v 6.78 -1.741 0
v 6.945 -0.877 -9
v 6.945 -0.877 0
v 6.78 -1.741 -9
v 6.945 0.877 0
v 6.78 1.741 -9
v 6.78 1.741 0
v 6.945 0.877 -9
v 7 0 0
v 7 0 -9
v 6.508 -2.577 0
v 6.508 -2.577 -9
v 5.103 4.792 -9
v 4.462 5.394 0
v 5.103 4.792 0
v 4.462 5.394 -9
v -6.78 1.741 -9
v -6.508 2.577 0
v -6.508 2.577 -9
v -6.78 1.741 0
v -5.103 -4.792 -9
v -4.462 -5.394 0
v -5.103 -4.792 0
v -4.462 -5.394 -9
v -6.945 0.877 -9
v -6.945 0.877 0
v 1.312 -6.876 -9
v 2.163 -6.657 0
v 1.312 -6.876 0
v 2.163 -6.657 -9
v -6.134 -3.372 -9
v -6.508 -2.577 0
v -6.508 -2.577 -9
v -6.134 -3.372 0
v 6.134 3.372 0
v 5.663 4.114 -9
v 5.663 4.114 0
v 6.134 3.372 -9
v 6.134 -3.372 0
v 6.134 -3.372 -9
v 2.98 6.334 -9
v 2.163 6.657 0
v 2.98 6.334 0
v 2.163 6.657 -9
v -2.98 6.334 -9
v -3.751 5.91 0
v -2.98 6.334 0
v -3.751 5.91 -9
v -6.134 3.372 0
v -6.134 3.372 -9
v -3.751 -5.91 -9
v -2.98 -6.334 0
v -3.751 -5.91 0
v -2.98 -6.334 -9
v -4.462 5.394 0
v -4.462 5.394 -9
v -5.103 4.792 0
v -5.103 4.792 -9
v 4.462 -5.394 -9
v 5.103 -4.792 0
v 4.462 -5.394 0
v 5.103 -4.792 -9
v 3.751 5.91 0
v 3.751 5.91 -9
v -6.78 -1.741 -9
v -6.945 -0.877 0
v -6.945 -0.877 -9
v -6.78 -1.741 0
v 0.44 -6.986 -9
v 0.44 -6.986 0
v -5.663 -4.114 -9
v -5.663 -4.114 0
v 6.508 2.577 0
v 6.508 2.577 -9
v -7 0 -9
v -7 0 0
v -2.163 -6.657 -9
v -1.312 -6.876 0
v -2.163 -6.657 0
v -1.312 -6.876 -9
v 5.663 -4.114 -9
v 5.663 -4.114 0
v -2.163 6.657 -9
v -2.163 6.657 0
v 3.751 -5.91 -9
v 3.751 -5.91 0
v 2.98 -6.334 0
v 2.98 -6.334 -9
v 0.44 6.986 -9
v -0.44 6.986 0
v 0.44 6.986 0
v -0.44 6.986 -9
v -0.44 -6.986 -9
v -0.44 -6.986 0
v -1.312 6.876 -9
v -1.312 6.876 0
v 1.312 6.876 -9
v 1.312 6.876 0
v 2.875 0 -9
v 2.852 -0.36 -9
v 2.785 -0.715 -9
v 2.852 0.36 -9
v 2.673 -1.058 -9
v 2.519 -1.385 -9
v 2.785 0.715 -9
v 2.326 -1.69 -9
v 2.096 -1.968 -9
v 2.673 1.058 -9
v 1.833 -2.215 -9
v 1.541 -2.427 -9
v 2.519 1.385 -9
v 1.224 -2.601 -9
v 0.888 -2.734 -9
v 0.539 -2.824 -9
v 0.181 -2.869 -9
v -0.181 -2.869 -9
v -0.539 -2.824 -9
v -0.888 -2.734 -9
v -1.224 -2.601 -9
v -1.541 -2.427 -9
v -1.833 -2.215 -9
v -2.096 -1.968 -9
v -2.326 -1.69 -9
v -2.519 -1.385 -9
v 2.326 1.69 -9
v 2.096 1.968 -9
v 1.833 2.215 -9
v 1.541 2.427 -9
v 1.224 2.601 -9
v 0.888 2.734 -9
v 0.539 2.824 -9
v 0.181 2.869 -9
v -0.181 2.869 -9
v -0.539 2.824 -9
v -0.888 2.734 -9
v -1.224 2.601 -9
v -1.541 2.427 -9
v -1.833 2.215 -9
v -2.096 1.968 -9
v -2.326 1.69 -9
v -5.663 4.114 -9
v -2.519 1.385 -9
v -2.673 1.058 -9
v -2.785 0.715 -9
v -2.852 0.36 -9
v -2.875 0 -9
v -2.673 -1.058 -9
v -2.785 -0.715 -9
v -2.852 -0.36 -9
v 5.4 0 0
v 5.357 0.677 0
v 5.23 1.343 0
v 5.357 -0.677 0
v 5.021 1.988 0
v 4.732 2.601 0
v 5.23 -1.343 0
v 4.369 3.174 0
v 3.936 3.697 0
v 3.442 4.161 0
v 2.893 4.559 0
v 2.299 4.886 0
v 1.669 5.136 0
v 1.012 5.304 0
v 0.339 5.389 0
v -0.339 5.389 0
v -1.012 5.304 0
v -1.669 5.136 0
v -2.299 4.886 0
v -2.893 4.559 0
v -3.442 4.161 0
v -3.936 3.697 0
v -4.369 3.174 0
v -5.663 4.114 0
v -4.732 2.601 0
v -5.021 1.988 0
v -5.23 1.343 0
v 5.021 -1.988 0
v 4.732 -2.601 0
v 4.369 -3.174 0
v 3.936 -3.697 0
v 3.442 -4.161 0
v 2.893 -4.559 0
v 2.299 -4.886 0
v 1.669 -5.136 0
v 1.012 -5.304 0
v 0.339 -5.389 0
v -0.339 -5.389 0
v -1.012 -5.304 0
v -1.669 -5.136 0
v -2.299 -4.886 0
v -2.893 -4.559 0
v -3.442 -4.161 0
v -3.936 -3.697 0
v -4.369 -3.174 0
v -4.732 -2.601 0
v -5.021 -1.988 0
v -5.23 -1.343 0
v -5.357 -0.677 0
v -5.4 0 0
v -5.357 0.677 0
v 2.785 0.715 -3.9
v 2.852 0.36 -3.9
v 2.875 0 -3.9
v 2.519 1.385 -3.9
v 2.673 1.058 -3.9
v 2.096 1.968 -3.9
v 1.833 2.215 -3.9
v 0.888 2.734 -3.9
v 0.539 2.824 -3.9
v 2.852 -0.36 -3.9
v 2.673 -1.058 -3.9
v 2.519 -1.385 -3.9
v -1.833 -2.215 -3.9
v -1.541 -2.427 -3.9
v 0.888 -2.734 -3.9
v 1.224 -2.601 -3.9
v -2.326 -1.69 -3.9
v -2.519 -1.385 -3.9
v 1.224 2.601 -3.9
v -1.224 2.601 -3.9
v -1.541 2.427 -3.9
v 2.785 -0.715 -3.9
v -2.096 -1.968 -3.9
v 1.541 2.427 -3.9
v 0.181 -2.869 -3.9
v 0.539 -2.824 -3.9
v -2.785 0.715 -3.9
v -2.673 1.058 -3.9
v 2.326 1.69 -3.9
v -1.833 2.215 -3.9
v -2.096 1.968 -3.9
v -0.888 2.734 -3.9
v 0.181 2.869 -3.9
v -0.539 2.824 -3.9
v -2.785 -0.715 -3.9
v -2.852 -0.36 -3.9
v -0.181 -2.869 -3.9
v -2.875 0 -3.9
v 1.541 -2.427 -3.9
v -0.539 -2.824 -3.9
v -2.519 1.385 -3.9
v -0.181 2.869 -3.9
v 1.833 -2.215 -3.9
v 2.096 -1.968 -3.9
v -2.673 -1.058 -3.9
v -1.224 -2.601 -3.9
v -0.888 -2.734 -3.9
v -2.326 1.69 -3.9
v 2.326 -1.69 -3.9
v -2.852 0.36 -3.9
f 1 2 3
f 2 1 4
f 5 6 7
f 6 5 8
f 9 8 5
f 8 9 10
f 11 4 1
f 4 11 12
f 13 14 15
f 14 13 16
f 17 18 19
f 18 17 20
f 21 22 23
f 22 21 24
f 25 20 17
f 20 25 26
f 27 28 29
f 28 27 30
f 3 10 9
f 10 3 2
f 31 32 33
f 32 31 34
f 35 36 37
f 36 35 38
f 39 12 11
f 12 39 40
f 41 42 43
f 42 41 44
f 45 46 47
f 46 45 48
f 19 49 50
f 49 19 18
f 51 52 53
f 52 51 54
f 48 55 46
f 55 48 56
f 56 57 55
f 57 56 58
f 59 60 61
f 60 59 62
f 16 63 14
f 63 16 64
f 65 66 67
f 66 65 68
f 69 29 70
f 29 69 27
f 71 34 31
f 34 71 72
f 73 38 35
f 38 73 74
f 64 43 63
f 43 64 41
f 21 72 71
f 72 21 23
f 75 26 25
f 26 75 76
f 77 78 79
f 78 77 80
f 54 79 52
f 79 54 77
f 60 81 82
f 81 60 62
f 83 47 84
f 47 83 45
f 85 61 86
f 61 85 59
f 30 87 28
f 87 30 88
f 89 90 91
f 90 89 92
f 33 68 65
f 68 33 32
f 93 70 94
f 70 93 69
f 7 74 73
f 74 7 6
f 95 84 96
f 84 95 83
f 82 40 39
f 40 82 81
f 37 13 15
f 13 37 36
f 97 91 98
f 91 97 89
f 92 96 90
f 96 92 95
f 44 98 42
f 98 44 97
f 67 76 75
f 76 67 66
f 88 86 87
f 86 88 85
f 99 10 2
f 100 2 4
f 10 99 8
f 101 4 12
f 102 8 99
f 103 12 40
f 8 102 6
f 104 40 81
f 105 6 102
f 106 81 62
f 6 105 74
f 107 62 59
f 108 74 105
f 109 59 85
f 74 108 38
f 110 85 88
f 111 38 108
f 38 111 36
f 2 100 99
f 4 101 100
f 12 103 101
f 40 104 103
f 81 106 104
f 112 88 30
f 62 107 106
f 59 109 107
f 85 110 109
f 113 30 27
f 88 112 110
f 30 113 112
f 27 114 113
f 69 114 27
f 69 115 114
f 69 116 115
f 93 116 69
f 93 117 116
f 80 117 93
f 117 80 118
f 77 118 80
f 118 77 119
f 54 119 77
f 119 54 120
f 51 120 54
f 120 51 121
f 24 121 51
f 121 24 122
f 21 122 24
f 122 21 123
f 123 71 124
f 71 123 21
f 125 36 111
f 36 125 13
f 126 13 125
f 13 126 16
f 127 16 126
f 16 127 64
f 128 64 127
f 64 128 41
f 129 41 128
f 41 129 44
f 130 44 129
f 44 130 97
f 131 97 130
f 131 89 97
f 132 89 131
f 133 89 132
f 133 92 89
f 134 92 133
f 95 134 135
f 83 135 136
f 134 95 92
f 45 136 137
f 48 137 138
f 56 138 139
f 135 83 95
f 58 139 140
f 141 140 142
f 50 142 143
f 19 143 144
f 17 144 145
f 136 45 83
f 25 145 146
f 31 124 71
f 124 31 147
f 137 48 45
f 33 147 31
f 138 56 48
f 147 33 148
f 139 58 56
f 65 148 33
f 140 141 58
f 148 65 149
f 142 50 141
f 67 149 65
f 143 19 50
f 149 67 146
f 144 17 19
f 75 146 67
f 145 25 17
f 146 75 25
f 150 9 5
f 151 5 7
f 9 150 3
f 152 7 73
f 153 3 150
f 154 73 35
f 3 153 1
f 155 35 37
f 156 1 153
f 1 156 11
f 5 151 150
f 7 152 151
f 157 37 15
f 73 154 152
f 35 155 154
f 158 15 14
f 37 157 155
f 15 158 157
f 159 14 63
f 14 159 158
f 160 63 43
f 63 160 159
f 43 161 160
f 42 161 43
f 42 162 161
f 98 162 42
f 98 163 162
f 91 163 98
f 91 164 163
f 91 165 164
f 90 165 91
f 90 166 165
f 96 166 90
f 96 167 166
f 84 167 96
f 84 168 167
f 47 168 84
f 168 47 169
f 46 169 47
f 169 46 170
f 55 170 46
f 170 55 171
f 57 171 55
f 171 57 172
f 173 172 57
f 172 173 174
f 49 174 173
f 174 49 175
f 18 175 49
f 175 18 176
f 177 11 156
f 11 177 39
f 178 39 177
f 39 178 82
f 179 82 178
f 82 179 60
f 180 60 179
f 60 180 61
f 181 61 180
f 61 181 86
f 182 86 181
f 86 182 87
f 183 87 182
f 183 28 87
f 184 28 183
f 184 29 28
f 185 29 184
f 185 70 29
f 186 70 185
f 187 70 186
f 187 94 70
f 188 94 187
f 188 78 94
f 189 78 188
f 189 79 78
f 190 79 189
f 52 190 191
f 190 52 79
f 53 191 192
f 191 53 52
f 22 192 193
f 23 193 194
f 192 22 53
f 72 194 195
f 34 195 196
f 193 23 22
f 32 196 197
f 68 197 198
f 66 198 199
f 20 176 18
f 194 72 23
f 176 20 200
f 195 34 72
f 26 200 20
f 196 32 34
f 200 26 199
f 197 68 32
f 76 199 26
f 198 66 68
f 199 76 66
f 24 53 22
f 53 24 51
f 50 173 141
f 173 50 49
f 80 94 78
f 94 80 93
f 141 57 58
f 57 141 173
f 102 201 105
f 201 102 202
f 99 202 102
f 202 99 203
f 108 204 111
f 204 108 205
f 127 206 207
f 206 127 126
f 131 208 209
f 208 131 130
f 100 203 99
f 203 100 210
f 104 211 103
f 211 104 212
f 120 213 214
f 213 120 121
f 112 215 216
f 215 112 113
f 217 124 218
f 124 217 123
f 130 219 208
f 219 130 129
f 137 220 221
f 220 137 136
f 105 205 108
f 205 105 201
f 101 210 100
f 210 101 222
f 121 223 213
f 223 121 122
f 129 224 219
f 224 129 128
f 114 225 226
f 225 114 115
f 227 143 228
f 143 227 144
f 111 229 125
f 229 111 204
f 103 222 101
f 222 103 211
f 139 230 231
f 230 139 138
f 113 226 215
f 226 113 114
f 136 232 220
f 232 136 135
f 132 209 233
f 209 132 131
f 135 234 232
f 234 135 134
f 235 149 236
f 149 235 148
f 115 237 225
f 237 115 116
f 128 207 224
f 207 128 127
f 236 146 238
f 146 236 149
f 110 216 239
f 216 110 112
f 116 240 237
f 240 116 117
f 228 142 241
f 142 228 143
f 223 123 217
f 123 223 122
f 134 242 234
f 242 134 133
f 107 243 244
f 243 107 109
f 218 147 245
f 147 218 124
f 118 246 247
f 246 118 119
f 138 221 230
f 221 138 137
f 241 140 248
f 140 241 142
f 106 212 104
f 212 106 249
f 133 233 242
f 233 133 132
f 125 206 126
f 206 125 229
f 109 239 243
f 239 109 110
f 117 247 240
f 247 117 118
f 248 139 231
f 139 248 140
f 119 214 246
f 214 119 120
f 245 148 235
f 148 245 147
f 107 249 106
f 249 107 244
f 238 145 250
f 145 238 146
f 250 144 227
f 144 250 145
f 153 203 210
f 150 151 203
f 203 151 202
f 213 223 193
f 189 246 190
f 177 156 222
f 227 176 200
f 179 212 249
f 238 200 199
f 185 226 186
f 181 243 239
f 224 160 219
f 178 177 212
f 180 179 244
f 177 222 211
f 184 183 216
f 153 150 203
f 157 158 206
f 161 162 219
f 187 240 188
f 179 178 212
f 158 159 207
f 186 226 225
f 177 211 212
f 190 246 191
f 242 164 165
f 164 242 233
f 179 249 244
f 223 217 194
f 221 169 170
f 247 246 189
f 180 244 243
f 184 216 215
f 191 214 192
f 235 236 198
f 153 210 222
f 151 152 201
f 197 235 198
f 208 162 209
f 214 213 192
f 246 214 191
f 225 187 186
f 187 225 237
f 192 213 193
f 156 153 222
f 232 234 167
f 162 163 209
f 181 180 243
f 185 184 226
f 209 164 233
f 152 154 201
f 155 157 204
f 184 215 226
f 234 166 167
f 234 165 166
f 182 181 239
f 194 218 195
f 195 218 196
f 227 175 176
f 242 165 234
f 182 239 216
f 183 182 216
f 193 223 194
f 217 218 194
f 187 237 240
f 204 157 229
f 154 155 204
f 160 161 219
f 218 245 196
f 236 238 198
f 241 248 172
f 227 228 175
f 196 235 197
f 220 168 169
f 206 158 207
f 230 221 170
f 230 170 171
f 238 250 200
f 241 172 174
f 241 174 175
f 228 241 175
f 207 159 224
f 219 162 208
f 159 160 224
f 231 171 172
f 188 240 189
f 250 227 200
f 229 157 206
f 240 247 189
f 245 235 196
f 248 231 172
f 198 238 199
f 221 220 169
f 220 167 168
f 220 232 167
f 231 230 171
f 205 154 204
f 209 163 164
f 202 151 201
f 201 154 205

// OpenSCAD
$fn = 50;


difference() {
	union() {
		translate(v = [0, 0, -9.0000000000]) {
			cylinder(h = 9, r = 7.0000000000);
		}
		#translate(v = [0, 0, -12.0000000000]) {
			cylinder(h = 12, r = 2.8750000000);
		}
	}
	union() {
		translate(v = [0, 0, 0]) {
			rotate(a = [0, 0, 0]) {
				difference() {
					union() {
						translate(v = [0, 0, -12.0000000000]) {
							cylinder(h = 12, r = 2.6000000000);
						}
						translate(v = [0, 0, -3.9000000000]) {
							cylinder(h = 3.9000000000, r1 = 2.8750000000, r2 = 5.4000000000);
						}
						translate(v = [0, 0, -12.0000000000]) {
							cylinder(h = 12, r = 2.8750000000);
						}
						translate(v = [0, 0, -12.0000000000]) {
							cylinder(h = 12, r = 2.6000000000);
						}
					}
					union();
				}
			}
		}
	}
}
